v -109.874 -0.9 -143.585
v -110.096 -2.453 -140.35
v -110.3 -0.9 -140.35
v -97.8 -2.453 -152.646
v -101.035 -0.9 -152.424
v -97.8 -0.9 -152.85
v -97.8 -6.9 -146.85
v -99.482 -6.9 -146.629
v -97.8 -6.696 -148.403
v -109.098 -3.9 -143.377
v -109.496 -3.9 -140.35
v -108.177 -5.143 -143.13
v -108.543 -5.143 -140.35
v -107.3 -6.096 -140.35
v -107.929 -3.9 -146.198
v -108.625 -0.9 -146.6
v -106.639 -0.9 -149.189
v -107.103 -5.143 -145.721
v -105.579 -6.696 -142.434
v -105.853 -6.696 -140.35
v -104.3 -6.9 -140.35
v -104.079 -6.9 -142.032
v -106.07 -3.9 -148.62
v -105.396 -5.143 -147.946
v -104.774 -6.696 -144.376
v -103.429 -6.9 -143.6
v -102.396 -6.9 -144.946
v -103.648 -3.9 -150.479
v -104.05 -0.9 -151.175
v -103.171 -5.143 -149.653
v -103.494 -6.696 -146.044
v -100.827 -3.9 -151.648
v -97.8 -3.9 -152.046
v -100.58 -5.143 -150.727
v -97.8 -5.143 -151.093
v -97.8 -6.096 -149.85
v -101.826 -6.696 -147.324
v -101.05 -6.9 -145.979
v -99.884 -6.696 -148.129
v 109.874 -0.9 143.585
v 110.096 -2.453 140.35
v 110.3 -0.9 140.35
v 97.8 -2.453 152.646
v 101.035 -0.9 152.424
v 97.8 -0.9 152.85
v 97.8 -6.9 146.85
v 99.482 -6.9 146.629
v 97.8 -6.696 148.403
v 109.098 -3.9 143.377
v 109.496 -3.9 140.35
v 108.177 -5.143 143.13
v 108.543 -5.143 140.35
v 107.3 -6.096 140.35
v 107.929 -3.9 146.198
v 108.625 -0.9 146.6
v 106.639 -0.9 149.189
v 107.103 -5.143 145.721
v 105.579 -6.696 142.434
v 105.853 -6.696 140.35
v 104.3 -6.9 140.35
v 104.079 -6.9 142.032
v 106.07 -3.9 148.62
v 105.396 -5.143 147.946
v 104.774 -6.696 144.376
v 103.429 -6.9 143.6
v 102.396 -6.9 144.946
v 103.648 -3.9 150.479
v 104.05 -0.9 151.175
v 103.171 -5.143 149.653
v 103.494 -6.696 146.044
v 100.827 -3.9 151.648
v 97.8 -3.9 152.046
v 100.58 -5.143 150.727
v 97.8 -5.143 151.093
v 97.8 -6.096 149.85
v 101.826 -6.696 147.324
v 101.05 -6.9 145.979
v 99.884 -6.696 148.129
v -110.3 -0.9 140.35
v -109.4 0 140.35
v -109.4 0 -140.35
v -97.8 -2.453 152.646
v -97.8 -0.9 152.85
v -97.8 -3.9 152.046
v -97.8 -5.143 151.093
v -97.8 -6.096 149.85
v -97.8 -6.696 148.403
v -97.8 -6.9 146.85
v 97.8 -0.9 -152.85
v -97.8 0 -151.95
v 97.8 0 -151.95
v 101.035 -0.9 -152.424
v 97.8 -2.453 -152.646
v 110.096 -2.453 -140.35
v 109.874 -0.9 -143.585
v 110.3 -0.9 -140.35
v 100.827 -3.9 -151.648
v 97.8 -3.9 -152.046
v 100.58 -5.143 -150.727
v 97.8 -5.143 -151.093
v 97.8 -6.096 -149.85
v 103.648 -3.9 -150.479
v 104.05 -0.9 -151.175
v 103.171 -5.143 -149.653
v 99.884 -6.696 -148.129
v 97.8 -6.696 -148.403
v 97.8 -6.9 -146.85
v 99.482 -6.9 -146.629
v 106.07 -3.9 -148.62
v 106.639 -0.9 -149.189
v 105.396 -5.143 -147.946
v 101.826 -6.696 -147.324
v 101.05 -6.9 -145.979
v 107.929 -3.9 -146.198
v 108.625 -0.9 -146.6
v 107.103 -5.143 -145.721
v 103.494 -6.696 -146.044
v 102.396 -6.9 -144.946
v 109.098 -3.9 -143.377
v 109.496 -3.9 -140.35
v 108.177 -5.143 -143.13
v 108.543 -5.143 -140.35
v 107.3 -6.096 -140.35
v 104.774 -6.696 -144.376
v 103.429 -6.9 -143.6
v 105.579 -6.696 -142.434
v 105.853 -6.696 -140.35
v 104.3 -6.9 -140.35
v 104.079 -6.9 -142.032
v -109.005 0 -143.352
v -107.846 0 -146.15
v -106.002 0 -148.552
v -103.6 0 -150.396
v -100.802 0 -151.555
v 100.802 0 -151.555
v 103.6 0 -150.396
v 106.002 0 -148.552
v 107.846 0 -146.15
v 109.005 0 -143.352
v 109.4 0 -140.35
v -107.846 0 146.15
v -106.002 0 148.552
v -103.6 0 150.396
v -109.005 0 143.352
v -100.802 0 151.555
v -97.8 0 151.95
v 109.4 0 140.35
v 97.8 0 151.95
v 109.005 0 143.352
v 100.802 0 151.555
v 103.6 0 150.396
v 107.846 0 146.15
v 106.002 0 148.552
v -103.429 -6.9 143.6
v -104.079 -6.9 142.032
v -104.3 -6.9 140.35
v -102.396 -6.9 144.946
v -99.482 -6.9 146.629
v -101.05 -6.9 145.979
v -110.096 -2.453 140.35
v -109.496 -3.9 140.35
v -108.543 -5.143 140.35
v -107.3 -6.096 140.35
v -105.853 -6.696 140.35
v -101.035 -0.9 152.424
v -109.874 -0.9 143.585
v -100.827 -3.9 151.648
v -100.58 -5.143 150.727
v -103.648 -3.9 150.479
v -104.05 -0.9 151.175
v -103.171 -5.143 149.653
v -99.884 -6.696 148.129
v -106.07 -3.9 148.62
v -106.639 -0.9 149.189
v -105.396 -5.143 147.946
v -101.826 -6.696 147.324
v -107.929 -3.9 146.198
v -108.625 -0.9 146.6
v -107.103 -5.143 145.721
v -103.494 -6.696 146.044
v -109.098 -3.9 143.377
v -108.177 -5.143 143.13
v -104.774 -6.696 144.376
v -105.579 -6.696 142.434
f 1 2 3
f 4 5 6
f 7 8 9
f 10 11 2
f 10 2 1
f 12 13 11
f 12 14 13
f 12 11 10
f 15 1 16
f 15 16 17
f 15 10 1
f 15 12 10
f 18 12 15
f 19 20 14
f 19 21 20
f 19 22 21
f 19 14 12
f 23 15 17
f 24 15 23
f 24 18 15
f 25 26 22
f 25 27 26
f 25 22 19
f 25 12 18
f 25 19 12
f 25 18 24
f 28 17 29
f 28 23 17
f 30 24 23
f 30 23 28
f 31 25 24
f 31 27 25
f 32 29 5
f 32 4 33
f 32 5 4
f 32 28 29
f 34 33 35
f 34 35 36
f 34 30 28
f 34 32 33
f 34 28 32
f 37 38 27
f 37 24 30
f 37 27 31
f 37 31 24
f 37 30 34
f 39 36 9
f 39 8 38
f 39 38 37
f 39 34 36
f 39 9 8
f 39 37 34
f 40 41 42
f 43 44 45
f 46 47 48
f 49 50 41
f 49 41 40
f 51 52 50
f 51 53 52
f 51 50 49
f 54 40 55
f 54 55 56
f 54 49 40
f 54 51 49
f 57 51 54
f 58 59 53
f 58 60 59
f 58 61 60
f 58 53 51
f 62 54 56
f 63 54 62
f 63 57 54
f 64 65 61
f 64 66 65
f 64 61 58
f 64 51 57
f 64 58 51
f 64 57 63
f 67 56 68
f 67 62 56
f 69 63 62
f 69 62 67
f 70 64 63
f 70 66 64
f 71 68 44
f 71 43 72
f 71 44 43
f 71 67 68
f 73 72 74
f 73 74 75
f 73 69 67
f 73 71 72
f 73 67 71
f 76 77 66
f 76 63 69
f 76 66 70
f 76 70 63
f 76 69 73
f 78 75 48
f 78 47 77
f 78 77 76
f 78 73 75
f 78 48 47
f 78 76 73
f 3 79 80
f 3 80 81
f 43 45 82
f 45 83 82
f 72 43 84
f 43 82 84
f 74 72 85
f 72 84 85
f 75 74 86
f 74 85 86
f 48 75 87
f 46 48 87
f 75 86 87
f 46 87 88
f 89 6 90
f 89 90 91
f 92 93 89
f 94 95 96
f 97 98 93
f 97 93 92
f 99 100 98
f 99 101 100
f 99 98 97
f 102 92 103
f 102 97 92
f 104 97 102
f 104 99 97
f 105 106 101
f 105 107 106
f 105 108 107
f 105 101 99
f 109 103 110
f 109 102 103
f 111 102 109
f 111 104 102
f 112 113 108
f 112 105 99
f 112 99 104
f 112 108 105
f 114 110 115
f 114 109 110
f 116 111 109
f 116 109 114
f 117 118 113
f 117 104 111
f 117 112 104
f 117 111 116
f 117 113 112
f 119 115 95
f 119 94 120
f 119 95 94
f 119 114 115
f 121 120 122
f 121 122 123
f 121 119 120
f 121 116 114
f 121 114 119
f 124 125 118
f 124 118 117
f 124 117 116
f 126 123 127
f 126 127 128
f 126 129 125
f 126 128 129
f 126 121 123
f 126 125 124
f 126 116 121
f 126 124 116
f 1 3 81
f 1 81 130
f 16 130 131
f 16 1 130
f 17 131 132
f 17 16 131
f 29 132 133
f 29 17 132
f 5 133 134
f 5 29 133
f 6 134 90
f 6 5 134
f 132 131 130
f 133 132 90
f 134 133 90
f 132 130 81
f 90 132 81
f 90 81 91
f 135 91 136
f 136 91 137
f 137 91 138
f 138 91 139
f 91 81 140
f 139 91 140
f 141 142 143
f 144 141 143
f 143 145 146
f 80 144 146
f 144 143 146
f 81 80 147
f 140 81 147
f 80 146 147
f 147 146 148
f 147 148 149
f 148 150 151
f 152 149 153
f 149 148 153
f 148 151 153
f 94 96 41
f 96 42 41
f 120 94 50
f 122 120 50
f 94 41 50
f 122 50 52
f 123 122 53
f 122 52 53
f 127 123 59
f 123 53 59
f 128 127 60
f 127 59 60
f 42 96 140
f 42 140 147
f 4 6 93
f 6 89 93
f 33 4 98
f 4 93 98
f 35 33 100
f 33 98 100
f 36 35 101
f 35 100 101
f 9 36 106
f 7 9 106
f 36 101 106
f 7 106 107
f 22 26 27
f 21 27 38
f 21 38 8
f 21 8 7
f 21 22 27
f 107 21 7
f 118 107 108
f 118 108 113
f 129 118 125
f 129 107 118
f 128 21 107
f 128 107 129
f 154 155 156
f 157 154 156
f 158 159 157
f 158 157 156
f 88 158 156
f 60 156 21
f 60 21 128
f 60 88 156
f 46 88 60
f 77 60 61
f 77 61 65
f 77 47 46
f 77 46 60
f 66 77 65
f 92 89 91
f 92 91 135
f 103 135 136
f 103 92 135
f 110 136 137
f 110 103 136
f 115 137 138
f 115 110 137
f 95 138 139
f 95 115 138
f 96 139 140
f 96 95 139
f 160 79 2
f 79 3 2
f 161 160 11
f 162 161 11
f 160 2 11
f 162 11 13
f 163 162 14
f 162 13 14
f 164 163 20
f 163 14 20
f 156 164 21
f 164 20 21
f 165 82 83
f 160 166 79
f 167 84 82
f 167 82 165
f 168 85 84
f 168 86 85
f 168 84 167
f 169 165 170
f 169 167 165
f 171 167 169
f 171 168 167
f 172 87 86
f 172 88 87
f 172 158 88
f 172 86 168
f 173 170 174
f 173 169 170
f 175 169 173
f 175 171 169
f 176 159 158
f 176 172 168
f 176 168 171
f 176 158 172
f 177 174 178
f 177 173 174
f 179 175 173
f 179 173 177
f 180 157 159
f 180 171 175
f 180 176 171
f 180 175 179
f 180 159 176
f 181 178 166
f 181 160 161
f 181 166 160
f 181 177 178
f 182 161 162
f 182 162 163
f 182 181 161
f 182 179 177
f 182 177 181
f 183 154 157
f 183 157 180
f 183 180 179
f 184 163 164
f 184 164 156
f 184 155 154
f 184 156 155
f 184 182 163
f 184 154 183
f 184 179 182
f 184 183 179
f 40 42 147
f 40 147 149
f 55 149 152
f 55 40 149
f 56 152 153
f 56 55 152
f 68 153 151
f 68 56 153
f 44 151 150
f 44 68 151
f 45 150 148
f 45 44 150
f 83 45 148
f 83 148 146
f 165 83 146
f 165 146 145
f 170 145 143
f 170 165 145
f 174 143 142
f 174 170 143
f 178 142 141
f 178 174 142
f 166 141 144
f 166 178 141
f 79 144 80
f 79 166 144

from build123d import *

# Parameters (mm, degrees)
F1_DEPTH = 6.9
F2_R     = 6
F3_SIZE  = 0.89999


# Not quite as in the source:
# - a fillet or chamfer is up to 0.001 mm smaller than in the source, because OpenCascade refuses the exact size


with BuildPart() as f1:
    # F0 (on Front) → F1 (new body)
    with BuildSketch(Plane.XZ):
        with BuildLine():
            Line((97.8, 152.85), (-97.8, 152.85))
            ThreePointArc((-97.8, 152.85), (-106.6388347648, 149.1888347648), (-110.3, 140.35))
            Line((-110.3, 140.35), (-110.3, -140.35))
            ThreePointArc((-110.3, -140.35), (-106.6388347648, -149.1888347648), (-97.8, -152.85))
            Line((-97.8, -152.85), (97.8, -152.85))
            ThreePointArc((97.8, -152.85), (106.6388347648, -149.1888347648), (110.3, -140.35))
            Line((110.3, -140.35), (110.3, 140.35))
            ThreePointArc((110.3, 140.35), (106.6388347648, 149.1888347648), (97.8, 152.85))
        make_face()
    extrude(amount=F1_DEPTH)

    # F2
    f2_edges = [f1.edges().sort_by_distance(p)[0] for p in [
        (110.3, -6.9, 0),
        (106.638835, -6.9, 149.188835),
        (0, -6.9, 152.85),
        (-106.638835, -6.9, 149.188835),
        (-110.3, -6.9, 0),
        (-106.638835, -6.9, -149.188835),
        (0, -6.9, -152.85),
        (106.638835, -6.9, -149.188835),
    ]]
    fillet(f2_edges, radius=F2_R)

    # F3 (size 0.9 in the source; OpenCascade refuses exactly that, so slightly less here)
    f3_edges = [f1.edges().sort_by_distance(p)[0] for p in [
        (110.3, 0, 0),
        (106.638835, 0, 149.188835),
        (0, 0, 152.85),
        (-106.638835, 0, 149.188835),
        (-110.3, 0, 0),
        (-106.638835, 0, -149.188835),
        (0, 0, -152.85),
        (106.638835, 0, -149.188835),
    ]]
    chamfer(f3_edges, length=F3_SIZE)


solid = f1.part
